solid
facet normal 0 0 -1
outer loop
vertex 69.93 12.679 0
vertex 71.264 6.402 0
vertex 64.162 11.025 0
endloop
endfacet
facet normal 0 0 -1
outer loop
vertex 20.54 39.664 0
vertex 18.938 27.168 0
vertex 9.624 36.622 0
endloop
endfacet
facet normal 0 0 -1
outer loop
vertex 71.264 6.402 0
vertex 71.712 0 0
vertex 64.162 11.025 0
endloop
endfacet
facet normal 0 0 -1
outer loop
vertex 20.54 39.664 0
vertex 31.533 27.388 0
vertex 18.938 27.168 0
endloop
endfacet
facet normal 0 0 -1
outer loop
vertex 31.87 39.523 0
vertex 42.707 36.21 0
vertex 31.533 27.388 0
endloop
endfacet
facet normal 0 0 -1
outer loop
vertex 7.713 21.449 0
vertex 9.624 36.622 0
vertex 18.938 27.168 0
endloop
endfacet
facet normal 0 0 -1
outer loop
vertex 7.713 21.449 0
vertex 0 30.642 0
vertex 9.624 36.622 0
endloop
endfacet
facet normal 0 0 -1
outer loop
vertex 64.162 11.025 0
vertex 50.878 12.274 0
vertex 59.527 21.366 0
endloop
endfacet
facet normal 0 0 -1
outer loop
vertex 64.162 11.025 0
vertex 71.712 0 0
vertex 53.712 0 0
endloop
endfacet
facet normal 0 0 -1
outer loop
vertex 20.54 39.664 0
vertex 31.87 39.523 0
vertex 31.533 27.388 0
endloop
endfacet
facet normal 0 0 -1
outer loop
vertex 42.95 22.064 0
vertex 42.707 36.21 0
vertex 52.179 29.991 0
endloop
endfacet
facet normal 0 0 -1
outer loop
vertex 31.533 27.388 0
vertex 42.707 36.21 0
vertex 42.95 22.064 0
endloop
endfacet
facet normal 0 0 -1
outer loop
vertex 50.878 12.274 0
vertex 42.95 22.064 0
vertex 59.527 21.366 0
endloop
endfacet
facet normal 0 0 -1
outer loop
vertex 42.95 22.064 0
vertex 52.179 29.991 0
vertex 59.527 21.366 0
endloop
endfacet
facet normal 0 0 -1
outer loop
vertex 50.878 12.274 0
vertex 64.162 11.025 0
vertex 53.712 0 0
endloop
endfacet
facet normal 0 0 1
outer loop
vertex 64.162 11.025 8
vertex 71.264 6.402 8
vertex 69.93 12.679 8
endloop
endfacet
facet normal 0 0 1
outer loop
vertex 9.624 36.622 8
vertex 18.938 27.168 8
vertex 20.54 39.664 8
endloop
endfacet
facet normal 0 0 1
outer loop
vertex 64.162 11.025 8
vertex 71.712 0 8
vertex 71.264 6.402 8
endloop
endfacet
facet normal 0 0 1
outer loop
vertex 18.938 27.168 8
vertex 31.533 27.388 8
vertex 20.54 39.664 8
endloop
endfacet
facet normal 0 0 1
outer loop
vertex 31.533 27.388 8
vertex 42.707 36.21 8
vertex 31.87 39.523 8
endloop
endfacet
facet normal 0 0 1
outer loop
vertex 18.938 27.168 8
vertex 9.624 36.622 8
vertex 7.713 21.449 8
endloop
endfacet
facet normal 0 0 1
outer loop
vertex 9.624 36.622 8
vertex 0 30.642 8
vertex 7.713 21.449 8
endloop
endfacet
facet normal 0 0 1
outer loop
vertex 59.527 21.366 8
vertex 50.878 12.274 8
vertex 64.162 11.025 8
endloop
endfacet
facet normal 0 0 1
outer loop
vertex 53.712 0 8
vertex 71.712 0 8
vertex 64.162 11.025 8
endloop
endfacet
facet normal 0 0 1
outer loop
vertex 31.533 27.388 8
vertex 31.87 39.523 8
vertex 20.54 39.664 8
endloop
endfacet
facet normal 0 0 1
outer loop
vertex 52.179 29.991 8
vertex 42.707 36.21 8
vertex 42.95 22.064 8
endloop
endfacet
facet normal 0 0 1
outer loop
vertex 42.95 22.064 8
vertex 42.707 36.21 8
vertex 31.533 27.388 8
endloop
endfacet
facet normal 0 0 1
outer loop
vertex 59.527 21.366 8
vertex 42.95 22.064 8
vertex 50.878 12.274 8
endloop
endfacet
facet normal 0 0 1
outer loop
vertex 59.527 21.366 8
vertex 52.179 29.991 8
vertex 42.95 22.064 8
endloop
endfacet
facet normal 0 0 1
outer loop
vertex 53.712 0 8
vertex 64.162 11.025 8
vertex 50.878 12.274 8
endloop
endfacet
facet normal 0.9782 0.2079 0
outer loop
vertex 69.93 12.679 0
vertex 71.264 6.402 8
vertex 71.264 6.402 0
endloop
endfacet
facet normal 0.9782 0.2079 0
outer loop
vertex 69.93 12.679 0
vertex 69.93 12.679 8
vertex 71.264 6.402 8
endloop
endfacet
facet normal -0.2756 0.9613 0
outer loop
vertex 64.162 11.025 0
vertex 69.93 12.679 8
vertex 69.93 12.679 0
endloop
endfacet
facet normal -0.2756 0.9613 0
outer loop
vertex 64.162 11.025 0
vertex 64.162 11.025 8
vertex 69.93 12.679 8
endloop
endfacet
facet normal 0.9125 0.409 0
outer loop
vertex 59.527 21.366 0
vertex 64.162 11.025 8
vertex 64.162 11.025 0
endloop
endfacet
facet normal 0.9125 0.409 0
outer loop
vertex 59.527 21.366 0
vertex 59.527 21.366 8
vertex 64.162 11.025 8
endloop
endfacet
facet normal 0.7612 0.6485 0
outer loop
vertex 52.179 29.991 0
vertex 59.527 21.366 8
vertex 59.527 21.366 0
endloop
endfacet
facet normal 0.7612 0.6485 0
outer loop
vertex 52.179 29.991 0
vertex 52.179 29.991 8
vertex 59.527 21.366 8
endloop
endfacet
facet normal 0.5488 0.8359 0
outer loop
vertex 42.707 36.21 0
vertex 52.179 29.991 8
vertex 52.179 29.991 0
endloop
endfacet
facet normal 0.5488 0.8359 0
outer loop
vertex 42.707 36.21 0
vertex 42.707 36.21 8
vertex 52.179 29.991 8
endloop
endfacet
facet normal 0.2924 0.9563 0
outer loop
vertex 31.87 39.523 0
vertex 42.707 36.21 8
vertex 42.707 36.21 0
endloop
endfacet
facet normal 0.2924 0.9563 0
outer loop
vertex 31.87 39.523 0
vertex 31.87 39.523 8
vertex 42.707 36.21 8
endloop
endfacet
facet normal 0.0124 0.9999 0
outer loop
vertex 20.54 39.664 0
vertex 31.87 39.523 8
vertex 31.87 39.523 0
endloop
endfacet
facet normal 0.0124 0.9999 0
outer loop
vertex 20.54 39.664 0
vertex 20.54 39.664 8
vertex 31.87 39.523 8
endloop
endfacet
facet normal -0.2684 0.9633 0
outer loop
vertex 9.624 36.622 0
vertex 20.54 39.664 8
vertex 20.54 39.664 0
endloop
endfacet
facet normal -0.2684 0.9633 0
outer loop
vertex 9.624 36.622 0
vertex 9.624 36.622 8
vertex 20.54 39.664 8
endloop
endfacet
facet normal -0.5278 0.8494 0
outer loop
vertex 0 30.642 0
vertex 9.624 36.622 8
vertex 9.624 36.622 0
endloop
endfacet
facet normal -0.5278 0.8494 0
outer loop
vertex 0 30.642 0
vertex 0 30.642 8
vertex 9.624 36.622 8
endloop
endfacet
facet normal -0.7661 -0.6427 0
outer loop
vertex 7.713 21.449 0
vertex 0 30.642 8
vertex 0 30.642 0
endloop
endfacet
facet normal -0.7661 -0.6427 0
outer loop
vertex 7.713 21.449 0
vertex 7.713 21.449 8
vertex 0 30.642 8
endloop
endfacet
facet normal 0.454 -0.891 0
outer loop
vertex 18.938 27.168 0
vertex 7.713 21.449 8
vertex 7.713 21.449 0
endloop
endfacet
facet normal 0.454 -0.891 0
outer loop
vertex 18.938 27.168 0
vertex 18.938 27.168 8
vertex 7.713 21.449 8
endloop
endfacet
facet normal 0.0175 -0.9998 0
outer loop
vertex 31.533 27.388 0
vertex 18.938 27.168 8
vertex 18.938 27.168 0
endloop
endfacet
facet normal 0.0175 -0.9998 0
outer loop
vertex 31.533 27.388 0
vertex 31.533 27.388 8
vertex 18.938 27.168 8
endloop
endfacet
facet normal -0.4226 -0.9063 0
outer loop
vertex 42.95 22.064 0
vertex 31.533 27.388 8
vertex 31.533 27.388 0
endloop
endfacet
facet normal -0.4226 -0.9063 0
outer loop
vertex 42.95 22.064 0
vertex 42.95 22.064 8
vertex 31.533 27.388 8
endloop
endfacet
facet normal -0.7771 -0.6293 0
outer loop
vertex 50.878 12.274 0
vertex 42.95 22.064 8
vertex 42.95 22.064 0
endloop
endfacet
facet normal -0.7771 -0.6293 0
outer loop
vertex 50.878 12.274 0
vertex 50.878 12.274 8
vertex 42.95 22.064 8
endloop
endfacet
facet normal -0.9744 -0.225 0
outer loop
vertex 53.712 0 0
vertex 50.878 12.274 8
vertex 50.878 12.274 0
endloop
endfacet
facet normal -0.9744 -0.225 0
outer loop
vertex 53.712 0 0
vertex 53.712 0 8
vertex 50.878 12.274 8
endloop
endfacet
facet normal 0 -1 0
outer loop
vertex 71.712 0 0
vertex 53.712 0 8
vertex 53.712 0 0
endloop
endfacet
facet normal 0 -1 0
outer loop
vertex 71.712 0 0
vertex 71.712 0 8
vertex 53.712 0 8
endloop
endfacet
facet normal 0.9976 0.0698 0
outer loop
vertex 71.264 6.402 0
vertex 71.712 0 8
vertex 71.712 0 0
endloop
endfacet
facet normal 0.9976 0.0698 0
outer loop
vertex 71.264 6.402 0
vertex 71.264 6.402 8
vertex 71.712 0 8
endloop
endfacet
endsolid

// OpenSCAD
$fn = 32;

// ----------------------------------------------------------------------
// Arc stop: segment, 8 mm thick
// ----------------------------------------------------------------------

// --- parameters (mm) ---
profile_height = 8;       // extrusion height
profile_points = 17;      // points of the closed outline

profile = [[71.712, 0], [71.264, 6.402], [69.93, 12.679], [64.162, 11.025], [59.527, 21.366], [52.179, 29.991], [42.707, 36.21], [31.87, 39.523], [20.54, 39.664], [9.624, 36.622], [0, 30.642], [7.713, 21.449], [18.938, 27.168], [31.533, 27.388], [42.95, 22.064], [50.878, 12.274], [53.712, 0]];  // single closed polygon, 17 points, counter clockwise

// --- the one profile operation ---
linear_extrude(height = profile_height) polygon(points = profile);
